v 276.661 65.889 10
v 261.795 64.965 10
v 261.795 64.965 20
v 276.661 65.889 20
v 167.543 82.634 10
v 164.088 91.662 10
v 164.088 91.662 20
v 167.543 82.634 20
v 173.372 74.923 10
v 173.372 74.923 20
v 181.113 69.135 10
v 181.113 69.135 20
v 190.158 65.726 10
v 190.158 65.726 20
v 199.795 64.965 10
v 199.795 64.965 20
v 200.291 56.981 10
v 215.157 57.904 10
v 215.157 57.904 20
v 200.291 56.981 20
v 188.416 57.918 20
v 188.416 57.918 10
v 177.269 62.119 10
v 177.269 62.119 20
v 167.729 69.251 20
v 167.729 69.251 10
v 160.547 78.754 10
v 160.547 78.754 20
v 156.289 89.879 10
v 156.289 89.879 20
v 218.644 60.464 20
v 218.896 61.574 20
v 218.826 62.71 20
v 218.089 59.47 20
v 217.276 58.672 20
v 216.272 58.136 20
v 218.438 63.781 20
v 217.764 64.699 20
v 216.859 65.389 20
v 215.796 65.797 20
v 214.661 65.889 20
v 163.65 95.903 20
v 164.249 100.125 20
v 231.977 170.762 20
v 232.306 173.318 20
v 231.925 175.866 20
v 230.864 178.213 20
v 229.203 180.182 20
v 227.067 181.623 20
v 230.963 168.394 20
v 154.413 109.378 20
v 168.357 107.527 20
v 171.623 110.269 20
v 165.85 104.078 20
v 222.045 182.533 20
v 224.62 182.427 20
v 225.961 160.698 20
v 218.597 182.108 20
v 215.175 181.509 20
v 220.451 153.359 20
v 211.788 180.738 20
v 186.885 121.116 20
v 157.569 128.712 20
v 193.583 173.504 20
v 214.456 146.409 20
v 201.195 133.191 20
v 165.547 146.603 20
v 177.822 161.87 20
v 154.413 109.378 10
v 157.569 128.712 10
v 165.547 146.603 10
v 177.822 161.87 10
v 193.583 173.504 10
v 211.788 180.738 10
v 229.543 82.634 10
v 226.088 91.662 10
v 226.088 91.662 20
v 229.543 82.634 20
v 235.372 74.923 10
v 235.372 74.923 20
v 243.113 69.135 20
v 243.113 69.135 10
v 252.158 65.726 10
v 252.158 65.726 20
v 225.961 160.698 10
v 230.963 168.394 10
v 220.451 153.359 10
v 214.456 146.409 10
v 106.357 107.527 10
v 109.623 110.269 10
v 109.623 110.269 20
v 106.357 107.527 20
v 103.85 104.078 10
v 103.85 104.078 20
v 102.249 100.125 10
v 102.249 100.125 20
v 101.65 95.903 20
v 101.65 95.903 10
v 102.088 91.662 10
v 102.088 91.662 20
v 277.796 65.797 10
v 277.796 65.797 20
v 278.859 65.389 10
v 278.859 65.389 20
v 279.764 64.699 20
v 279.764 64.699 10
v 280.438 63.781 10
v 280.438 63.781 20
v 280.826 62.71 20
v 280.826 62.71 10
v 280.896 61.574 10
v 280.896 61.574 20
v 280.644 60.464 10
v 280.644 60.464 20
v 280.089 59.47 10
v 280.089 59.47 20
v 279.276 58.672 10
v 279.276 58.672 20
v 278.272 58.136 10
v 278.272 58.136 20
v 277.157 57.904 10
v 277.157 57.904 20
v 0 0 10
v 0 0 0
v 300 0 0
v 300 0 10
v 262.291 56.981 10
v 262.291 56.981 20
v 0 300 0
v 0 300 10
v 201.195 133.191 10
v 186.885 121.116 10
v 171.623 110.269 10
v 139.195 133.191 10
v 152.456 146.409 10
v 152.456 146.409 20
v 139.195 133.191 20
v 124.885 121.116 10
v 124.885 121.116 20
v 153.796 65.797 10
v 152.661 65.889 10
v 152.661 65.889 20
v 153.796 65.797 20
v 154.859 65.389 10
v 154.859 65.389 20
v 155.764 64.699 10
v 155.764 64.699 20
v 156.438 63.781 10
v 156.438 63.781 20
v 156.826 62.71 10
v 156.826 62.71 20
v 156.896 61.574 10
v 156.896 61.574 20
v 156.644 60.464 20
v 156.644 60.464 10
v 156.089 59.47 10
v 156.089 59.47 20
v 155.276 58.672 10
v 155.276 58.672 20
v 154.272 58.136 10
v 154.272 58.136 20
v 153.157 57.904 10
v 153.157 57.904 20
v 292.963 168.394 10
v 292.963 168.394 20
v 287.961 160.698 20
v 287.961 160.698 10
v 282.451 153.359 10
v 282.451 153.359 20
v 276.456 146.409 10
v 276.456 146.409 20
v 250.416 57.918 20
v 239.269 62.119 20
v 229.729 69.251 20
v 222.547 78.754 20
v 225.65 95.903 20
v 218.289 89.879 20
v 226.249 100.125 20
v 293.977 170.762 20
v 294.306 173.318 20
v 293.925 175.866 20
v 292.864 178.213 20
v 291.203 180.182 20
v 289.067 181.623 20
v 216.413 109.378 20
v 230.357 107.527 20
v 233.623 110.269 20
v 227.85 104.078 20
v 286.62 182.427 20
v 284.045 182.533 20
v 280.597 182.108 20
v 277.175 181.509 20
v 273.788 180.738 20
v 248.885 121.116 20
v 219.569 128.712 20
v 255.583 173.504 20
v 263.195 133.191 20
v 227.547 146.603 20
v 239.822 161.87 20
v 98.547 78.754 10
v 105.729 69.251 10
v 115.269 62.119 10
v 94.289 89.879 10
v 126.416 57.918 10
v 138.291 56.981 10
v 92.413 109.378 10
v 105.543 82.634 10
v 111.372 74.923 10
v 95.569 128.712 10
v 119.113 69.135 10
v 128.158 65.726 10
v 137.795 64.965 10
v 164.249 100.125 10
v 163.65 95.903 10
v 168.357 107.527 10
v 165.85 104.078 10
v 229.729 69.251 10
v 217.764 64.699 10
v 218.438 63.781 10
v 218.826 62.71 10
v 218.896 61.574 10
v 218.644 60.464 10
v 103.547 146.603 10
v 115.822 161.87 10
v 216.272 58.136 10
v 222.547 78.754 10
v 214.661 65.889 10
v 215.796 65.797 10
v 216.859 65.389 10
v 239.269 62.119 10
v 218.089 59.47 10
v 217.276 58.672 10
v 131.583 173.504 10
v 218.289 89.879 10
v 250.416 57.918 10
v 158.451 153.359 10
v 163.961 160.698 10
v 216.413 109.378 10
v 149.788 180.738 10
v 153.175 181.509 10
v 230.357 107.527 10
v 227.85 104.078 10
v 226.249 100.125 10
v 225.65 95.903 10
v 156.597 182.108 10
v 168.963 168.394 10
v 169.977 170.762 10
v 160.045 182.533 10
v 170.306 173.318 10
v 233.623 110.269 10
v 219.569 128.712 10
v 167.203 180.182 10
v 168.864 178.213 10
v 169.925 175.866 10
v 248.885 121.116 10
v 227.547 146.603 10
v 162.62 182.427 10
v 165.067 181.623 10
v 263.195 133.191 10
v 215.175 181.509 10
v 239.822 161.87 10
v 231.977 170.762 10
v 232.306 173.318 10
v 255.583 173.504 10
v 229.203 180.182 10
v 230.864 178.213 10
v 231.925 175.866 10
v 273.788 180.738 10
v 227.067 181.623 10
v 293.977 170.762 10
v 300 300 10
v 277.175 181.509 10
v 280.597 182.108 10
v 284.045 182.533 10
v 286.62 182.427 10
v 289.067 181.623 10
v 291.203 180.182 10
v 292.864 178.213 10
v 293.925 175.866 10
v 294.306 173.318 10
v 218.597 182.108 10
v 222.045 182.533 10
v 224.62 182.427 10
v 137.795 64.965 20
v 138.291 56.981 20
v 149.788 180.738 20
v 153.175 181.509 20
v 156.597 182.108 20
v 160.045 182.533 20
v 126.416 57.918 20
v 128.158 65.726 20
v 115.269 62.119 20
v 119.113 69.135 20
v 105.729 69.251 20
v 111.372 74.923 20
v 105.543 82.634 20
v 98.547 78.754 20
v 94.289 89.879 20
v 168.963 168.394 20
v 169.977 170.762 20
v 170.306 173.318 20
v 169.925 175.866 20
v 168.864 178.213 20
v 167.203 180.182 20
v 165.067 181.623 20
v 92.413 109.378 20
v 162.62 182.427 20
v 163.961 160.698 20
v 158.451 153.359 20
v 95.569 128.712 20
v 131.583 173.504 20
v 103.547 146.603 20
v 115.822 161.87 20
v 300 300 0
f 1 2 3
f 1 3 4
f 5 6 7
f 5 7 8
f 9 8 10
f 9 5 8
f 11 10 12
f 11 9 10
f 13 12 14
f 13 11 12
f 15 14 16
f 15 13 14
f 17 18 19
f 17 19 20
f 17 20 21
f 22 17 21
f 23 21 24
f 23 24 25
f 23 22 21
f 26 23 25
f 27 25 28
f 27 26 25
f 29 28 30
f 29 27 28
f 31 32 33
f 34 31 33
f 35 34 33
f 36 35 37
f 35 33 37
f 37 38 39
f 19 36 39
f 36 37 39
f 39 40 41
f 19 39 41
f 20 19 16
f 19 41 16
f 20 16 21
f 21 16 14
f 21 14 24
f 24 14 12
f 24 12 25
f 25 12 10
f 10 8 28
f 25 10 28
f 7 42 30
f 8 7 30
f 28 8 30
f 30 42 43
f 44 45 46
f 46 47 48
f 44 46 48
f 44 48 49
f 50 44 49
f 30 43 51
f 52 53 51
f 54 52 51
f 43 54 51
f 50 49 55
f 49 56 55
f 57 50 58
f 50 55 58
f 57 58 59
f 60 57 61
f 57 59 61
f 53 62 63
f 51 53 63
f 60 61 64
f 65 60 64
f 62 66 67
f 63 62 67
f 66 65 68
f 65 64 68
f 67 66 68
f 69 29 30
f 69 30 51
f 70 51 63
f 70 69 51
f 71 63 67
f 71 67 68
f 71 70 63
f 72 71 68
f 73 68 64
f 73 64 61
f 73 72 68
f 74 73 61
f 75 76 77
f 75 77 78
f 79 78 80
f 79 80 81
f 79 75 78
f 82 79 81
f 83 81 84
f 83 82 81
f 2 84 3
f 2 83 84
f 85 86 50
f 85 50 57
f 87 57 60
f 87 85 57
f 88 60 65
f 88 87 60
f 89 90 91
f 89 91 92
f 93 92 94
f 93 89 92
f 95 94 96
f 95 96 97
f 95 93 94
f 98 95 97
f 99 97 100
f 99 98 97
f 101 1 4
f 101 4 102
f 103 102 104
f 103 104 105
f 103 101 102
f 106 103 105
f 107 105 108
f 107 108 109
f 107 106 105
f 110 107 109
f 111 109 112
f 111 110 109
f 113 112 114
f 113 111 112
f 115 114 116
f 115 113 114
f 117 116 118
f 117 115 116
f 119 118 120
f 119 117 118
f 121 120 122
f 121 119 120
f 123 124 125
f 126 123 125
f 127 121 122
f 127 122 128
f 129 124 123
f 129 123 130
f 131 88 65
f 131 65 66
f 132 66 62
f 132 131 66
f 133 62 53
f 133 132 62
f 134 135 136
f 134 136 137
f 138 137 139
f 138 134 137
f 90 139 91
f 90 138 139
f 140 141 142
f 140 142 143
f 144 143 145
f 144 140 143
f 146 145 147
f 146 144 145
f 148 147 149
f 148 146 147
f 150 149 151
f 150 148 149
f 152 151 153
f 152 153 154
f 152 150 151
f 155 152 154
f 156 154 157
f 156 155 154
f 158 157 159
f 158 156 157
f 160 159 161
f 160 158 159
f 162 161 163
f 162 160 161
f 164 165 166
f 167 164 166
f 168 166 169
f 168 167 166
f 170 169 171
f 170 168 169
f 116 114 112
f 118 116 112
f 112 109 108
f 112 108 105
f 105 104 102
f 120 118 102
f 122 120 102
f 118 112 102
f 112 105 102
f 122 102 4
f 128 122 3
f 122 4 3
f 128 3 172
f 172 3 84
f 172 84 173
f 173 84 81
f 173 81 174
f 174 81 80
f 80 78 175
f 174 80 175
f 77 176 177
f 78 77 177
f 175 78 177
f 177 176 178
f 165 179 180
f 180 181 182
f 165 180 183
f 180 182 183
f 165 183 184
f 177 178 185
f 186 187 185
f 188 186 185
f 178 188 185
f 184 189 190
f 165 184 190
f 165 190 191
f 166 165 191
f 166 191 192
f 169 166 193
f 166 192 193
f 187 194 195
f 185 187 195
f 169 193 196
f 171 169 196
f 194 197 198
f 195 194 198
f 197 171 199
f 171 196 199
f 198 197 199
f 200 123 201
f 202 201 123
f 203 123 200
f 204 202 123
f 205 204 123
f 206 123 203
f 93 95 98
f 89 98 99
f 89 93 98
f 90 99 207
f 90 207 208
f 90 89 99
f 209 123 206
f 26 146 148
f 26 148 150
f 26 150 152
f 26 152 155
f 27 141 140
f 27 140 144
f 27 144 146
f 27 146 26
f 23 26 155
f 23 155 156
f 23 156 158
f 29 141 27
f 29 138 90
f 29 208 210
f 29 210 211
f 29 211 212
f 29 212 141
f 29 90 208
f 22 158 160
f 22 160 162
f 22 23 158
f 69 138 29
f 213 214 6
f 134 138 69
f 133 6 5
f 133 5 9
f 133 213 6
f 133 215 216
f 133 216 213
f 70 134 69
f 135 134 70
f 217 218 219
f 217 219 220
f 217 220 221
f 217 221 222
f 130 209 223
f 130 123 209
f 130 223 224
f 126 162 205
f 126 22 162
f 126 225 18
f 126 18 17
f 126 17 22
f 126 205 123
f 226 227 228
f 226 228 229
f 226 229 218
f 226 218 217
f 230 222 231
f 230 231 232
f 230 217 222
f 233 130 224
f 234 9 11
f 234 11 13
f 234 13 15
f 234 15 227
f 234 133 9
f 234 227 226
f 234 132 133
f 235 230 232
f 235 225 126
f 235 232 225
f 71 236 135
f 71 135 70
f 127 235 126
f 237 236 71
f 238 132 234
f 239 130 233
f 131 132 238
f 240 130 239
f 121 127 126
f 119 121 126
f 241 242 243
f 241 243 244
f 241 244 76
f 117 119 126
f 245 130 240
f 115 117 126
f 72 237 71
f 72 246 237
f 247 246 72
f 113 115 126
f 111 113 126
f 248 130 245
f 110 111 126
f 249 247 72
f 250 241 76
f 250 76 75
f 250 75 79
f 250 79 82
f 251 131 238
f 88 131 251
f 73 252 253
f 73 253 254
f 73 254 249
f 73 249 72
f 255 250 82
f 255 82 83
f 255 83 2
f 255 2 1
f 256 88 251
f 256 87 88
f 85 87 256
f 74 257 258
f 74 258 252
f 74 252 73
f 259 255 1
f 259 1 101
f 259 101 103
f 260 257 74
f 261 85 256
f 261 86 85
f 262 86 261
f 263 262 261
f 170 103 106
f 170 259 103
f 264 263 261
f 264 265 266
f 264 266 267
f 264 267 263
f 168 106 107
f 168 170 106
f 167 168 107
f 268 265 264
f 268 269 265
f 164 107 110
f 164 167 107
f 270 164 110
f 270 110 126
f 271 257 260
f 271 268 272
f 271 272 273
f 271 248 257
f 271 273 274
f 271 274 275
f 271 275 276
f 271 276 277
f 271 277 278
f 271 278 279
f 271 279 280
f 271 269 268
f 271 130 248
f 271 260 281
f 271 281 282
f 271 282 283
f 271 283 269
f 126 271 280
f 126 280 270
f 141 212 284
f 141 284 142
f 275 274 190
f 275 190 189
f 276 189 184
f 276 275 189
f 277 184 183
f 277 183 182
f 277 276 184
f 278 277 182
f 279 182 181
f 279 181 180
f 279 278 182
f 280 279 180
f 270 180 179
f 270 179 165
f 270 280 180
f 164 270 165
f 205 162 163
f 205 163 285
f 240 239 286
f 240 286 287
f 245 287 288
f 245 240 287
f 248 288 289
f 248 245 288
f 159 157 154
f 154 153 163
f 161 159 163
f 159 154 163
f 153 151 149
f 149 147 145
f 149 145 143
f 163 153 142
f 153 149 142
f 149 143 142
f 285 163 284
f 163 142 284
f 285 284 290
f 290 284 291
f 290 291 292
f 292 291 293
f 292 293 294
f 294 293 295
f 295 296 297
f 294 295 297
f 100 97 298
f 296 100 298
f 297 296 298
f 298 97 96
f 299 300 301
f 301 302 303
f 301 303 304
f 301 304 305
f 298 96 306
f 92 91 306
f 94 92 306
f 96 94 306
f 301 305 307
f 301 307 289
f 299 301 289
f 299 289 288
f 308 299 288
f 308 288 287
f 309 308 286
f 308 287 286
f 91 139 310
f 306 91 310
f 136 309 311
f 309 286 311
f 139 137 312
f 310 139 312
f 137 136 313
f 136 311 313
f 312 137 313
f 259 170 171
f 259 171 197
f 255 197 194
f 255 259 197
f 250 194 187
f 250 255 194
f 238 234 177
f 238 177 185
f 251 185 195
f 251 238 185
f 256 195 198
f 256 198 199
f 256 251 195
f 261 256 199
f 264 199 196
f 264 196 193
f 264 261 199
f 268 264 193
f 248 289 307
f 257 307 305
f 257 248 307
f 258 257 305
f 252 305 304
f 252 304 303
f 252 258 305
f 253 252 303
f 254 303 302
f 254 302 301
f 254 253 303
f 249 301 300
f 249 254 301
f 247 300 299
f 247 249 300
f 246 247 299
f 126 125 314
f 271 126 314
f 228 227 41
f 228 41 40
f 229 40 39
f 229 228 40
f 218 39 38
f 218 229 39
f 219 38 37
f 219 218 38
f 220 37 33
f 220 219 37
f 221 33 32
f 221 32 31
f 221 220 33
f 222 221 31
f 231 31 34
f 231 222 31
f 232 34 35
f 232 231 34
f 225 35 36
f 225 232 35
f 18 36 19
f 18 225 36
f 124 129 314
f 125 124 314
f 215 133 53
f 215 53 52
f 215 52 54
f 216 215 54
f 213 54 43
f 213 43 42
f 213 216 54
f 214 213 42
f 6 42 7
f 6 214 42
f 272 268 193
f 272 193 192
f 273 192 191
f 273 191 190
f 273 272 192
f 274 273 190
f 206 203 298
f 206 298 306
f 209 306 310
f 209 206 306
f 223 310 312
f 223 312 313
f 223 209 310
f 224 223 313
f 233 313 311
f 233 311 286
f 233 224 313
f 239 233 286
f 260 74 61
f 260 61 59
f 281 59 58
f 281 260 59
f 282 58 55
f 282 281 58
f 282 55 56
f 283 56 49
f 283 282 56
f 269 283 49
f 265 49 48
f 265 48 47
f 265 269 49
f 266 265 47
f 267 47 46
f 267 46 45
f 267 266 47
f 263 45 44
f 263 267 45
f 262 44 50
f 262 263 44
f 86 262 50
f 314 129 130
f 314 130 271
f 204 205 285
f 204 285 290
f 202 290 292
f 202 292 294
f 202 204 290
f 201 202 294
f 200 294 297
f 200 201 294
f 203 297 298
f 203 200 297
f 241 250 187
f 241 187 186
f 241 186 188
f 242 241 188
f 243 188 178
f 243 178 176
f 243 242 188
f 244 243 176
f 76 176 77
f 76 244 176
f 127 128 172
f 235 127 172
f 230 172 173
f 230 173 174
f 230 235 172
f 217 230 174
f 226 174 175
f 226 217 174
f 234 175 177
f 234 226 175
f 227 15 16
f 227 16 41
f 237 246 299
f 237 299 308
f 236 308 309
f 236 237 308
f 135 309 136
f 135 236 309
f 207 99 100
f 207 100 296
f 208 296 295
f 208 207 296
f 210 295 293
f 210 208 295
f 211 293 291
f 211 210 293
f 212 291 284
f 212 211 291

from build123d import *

# Parameters (mm, degrees)
SKICA1_W                = 300
SKICA1_H                = 300
P_IDAT_VYSUNUT_M1_DEPTH = 10
P_IDAT_VYSUNUT_M3_DEPTH = 10


with BuildPart() as part:
    # Skica1 → Přidat vysunutím1 (new body)
    with BuildSketch(Plane.XY):
        with Locations((150, 150)):
            Rectangle(SKICA1_W, SKICA1_H)
    extrude(amount=P_IDAT_VYSUNUT_M1_DEPTH)

    # Skica3 → Přidat vysunutím3 (add)
    with BuildSketch(Plane.XY.offset(10)):
        with BuildLine():
            Line((153.157459628, 57.904394304), (138.29070055, 56.980883154))
            ThreePointArc((138.29070055, 56.980883154), (110.247943411, 65.348513102), (94.289058074, 89.878646361))
            ThreePointArc((94.289058074, 89.878646361), (103.547245504, 146.603196293), (149.788099838, 180.737812008))
            ThreePointArc((149.788099838, 180.737812008), (154.882621426, 181.830553973), (160.045482007, 182.53276892))
            ThreePointArc((160.045482007, 182.53276892), (168.864101161, 178.213116415), (168.96323198, 168.393869264))
            ThreePointArc((168.96323198, 168.393869264), (161.268139192, 156.982073578), (152.456108269, 146.408916775))
            ThreePointArc((152.456108269, 146.408916775), (132.164950971, 127.005263014), (109.623212842, 110.268988463))
            ThreePointArc((109.623212842, 110.268988463), (102.928809573, 102.150565652), (102.087824963, 91.661687307))
            ThreePointArc((102.087824963, 91.661687307), (115.038295459, 71.755737716), (137.794703021, 64.965492503))
            Line((137.794703021, 64.965492503), (152.6614621, 65.889003653))
            ThreePointArc((152.6614621, 65.889003653), (156.901765538, 62.144697743), (153.157459628, 57.904394304))
        make_face()
        with BuildLine():
            Line((215.157459628, 57.904394304), (200.29070055, 56.980883154))
            ThreePointArc((200.29070055, 56.980883154), (172.247943411, 65.348513102), (156.289058074, 89.878646361))
            ThreePointArc((156.289058074, 89.878646361), (165.547245504, 146.603196293), (211.788099838, 180.737812008))
            ThreePointArc((211.788099838, 180.737812008), (216.882621426, 181.830553973), (222.045482007, 182.53276892))
            ThreePointArc((222.045482007, 182.53276892), (230.864101161, 178.213116415), (230.96323198, 168.393869264))
            ThreePointArc((230.96323198, 168.393869264), (223.268139192, 156.982073578), (214.456108269, 146.408916775))
            ThreePointArc((214.456108269, 146.408916775), (194.164950971, 127.005263014), (171.623212842, 110.268988463))
            ThreePointArc((171.623212842, 110.268988463), (164.928809573, 102.150565652), (164.087824963, 91.661687307))
            ThreePointArc((164.087824963, 91.661687307), (177.038295459, 71.755737716), (199.794703021, 64.965492503))
            Line((199.794703021, 64.965492503), (214.6614621, 65.889003653))
            ThreePointArc((214.6614621, 65.889003653), (218.901765538, 62.144697743), (215.157459628, 57.904394304))
        make_face()
        with BuildLine():
            Line((277.157459628, 57.904394304), (262.29070055, 56.980883154))
            ThreePointArc((262.29070055, 56.980883154), (234.247943411, 65.348513102), (218.289058074, 89.878646361))
            ThreePointArc((218.289058074, 89.878646361), (227.547245504, 146.603196293), (273.788099838, 180.737812008))
            ThreePointArc((273.788099838, 180.737812008), (278.882621426, 181.830553973), (284.045482007, 182.53276892))
            ThreePointArc((284.045482007, 182.53276892), (292.864101161, 178.213116415), (292.96323198, 168.393869264))
            ThreePointArc((292.96323198, 168.393869264), (285.268139192, 156.982073578), (276.456108269, 146.408916775))
            ThreePointArc((276.456108269, 146.408916775), (256.164950971, 127.005263014), (233.623212842, 110.268988463))
            ThreePointArc((233.623212842, 110.268988463), (226.928809573, 102.150565652), (226.087824963, 91.661687307))
            ThreePointArc((226.087824963, 91.661687307), (239.038295459, 71.755737716), (261.794703021, 64.965492503))
            Line((261.794703021, 64.965492503), (276.6614621, 65.889003653))
            ThreePointArc((276.6614621, 65.889003653), (280.901765538, 62.144697743), (277.157459628, 57.904394304))
        make_face()
    extrude(amount=P_IDAT_VYSUNUT_M3_DEPTH)


solid = part.part
